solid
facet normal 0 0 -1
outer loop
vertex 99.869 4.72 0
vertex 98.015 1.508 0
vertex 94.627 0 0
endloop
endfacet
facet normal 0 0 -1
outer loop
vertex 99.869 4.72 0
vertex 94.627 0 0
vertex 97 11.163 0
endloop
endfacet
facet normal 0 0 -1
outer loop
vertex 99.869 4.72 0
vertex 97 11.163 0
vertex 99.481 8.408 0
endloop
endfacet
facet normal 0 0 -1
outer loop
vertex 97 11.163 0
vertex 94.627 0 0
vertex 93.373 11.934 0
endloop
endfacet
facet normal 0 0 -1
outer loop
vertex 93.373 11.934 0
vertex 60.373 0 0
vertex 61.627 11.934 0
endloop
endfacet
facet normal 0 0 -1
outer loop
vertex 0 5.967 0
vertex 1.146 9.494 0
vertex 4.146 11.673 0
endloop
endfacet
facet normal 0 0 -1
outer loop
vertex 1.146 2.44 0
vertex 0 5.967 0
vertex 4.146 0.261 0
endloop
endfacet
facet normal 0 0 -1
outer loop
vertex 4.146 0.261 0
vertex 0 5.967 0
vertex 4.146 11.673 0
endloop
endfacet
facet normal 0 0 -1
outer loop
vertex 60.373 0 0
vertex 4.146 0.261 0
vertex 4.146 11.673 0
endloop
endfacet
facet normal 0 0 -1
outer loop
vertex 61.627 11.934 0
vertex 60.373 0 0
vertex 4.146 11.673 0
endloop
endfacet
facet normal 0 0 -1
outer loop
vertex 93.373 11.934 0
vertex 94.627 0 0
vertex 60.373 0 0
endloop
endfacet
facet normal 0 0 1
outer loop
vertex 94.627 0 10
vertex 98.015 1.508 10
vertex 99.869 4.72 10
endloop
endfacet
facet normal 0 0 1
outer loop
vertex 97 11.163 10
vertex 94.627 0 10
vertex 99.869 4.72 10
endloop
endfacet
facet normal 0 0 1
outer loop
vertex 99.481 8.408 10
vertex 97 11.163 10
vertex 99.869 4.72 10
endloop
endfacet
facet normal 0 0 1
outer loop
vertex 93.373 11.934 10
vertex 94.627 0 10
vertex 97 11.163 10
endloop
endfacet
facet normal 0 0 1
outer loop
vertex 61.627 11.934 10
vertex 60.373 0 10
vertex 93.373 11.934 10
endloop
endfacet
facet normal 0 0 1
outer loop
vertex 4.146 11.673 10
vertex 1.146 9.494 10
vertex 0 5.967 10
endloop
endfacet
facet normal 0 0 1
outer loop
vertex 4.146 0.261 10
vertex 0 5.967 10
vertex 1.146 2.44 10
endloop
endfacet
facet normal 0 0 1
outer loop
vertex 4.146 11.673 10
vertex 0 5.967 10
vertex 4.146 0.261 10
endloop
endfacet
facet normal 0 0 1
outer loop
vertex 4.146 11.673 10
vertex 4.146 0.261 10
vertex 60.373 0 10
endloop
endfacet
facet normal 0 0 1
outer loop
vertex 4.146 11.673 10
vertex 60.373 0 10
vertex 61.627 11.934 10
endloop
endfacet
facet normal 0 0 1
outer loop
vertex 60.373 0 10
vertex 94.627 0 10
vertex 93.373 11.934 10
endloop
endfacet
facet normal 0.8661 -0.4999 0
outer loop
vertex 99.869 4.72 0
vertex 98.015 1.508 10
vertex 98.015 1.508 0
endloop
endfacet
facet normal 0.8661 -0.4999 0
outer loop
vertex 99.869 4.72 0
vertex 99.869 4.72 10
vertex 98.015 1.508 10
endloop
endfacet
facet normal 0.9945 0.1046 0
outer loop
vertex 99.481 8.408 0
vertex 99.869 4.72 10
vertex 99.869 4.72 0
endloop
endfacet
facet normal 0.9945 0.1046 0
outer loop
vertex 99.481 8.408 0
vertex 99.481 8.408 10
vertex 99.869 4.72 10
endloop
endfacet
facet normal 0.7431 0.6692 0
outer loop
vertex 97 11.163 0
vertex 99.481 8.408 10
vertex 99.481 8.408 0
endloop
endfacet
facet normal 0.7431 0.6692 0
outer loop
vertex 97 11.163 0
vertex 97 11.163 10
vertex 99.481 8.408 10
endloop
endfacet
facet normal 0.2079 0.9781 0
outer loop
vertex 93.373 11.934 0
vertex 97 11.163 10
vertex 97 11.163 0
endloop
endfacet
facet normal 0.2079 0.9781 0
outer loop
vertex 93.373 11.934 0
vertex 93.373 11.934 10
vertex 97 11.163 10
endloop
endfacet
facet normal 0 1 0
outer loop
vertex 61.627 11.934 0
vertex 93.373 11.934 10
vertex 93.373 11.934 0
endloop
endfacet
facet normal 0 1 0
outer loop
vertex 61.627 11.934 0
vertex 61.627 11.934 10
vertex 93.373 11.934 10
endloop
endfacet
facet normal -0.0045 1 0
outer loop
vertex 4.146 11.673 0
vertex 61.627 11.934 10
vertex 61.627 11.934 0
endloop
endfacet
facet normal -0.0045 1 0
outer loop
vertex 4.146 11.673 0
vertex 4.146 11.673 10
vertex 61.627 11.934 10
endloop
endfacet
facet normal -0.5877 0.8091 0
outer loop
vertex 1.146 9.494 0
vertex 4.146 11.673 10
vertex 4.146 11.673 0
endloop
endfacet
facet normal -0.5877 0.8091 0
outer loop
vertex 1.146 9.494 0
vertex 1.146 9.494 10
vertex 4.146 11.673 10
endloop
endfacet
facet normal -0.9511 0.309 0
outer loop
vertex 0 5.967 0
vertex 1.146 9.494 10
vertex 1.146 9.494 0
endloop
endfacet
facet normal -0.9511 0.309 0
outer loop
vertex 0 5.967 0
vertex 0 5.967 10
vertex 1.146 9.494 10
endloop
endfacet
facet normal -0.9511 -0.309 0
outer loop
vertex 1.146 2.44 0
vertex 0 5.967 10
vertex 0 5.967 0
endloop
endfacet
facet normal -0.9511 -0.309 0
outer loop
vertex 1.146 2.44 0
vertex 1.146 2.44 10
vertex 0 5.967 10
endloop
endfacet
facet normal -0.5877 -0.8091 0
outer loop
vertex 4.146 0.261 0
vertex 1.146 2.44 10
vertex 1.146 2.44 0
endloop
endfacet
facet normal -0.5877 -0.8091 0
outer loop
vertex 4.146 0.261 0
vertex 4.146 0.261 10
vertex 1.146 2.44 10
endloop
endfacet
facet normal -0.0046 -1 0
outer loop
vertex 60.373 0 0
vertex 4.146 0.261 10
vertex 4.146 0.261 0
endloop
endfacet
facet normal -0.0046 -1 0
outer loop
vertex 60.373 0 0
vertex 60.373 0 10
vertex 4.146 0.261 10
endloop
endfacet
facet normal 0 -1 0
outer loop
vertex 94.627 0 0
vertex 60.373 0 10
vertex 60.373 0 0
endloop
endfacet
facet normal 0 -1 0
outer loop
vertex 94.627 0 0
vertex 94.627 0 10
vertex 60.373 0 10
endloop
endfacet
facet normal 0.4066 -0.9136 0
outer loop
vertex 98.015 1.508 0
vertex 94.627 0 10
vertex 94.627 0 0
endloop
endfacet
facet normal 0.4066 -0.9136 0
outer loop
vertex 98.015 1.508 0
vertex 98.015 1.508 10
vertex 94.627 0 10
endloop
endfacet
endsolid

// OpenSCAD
$fn = 32;

// ----------------------------------------------------------------------
// Lever arm: two bosses 12 and 12 mm, 55 mm between centres
// ----------------------------------------------------------------------

// --- parameters (mm) ---
profile_height = 10;      // extrusion height
profile_points = 13;      // points of the closed outline

profile = [[0, 5.967], [1.146, 2.44], [4.146, 0.261], [60.373, 0], [94.627, 0], [98.015, 1.508], [99.869, 4.72], [99.481, 8.408], [97, 11.163], [93.373, 11.934], [61.627, 11.934], [4.146, 11.673], [1.146, 9.494]];  // single closed polygon, 13 points, counter clockwise

// --- the one profile operation ---
linear_extrude(height = profile_height) polygon(points = profile);
